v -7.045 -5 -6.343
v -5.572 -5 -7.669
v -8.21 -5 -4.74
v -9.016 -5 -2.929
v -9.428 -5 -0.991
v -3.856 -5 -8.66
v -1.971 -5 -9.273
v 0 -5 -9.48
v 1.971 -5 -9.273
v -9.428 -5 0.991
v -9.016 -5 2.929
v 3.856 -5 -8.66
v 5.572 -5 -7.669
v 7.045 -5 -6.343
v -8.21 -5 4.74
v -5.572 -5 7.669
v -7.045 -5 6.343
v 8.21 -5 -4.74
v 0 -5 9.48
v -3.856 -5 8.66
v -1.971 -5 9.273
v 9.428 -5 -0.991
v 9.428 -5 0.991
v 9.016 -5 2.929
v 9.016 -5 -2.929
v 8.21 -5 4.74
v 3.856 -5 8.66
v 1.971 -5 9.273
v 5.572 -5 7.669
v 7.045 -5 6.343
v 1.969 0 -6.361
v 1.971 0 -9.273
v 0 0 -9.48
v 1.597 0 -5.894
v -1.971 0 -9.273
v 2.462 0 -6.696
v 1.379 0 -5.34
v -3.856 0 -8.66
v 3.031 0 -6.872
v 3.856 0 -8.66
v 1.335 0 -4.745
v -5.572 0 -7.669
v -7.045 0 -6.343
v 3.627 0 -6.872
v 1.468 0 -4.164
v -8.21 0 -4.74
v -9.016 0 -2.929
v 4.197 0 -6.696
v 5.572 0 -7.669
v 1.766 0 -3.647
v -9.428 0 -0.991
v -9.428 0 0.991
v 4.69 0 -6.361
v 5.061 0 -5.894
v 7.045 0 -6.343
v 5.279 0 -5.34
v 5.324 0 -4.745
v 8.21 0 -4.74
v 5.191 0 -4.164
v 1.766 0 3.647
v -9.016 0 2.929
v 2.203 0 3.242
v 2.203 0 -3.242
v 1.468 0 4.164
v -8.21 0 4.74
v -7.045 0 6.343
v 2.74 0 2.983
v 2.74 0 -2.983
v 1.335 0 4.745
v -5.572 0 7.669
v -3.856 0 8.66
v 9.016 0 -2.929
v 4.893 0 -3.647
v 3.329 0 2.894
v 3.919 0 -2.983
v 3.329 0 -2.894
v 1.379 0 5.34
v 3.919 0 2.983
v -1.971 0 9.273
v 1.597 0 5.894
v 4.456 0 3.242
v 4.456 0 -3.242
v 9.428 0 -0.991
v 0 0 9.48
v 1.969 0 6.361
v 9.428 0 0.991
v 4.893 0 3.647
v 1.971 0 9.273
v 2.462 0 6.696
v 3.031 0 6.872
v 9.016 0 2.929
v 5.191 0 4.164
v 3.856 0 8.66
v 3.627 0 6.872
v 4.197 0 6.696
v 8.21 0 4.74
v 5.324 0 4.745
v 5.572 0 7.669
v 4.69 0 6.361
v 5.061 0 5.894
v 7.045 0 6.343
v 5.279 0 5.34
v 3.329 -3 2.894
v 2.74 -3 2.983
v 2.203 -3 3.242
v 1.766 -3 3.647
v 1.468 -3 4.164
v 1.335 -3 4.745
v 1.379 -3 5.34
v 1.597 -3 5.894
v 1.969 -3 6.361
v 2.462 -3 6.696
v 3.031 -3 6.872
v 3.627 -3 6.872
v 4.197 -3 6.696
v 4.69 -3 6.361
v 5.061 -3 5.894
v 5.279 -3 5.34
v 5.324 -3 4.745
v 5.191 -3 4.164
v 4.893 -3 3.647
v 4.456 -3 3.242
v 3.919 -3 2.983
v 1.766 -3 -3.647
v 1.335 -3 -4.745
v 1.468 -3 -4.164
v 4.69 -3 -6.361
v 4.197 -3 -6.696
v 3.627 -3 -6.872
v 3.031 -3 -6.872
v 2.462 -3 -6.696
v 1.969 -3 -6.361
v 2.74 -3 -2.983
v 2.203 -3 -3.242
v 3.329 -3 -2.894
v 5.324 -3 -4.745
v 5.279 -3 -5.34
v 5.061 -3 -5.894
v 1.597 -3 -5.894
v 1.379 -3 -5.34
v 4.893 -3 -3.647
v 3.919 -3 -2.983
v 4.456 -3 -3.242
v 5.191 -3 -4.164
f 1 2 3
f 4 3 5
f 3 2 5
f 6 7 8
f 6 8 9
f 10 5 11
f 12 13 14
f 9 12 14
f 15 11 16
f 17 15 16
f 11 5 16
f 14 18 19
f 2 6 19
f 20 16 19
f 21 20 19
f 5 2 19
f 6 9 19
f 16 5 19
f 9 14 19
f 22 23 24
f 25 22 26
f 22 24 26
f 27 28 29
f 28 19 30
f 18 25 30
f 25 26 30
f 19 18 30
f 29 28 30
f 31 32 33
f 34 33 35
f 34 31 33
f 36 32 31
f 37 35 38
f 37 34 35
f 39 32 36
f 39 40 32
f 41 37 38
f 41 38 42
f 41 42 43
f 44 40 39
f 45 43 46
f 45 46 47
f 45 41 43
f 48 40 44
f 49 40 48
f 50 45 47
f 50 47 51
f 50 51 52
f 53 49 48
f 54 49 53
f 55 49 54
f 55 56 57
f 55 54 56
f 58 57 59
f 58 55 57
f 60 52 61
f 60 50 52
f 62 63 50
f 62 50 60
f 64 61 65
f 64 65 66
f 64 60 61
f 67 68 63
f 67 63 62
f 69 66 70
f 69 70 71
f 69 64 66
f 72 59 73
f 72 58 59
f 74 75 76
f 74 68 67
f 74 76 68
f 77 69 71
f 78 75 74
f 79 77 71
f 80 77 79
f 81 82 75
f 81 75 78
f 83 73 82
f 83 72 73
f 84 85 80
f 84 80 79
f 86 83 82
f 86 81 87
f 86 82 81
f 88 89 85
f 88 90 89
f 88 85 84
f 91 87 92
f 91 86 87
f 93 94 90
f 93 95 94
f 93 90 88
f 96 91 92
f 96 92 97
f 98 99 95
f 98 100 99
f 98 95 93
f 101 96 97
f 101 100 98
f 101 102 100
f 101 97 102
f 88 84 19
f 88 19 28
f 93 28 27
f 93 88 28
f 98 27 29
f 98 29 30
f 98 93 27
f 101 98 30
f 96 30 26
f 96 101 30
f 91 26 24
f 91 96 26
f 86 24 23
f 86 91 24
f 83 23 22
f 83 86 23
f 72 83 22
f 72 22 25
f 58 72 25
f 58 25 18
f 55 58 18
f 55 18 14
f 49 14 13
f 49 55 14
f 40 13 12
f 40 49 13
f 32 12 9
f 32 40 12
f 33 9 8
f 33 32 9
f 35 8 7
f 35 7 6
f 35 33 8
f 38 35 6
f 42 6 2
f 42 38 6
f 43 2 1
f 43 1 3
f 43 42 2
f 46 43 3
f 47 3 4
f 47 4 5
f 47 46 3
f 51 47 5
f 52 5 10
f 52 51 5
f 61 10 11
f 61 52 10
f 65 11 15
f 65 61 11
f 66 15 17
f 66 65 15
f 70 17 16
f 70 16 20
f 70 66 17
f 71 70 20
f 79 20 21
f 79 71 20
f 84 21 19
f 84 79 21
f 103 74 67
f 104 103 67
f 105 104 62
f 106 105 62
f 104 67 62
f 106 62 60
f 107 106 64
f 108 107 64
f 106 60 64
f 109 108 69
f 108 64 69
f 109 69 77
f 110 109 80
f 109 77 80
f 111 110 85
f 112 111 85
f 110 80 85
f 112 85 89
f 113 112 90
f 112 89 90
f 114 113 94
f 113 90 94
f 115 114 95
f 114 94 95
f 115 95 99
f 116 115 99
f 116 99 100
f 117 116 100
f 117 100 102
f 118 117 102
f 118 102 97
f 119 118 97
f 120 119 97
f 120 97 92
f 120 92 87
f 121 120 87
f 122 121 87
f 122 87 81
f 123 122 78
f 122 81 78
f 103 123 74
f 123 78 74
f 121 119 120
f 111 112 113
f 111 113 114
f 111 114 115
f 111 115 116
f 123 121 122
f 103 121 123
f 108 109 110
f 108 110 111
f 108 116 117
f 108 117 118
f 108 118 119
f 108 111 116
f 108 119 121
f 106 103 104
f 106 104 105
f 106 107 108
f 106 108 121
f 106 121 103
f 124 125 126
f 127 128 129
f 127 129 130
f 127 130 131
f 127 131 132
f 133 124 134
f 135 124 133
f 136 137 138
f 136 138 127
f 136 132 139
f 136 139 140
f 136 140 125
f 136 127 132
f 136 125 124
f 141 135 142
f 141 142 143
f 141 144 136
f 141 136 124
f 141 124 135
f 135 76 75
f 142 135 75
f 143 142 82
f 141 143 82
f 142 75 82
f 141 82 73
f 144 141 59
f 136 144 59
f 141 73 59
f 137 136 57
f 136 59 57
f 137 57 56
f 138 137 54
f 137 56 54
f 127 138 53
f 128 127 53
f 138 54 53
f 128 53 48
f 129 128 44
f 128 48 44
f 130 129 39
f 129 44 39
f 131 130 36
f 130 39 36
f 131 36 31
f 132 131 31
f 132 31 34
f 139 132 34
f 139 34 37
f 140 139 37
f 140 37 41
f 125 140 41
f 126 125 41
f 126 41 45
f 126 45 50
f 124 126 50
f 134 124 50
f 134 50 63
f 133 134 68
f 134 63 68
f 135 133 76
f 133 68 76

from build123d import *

# Parameters (mm, degrees)
SKETCH1_R           = 9.48
BOSS_EXTRUDE1_DEPTH = 5
SKETCH2_R           = 2
CUT_EXTRUDE1_DEPTH  = 3


with BuildPart() as part:
    # Sketch1 → Boss-Extrude1 (new body)
    with BuildSketch(Plane(origin=(0, 0, 0), x_dir=(1, 0, 0), z_dir=(0, 1, 0))):
        with Locations(Location((0, 0, 0), (0, 0, 270))):
            Circle(SKETCH1_R)
    extrude(amount=-BOSS_EXTRUDE1_DEPTH)

    # Sketch2 → Cut-Extrude1 (cut)
    with BuildSketch(Plane(origin=(0, 0, 0), x_dir=(1, 0, 0), z_dir=(0, 1, 0))):
        with Locations(Location((3.329285114, 4.894478506, 0), (0, 0, 270))):
            Circle(SKETCH2_R)
        with Locations(Location((3.329285114, -4.894478506, 0), (0, 0, 90))):
            Circle(SKETCH2_R)
    extrude(amount=-CUT_EXTRUDE1_DEPTH, mode=Mode.SUBTRACT)


solid = part.part
